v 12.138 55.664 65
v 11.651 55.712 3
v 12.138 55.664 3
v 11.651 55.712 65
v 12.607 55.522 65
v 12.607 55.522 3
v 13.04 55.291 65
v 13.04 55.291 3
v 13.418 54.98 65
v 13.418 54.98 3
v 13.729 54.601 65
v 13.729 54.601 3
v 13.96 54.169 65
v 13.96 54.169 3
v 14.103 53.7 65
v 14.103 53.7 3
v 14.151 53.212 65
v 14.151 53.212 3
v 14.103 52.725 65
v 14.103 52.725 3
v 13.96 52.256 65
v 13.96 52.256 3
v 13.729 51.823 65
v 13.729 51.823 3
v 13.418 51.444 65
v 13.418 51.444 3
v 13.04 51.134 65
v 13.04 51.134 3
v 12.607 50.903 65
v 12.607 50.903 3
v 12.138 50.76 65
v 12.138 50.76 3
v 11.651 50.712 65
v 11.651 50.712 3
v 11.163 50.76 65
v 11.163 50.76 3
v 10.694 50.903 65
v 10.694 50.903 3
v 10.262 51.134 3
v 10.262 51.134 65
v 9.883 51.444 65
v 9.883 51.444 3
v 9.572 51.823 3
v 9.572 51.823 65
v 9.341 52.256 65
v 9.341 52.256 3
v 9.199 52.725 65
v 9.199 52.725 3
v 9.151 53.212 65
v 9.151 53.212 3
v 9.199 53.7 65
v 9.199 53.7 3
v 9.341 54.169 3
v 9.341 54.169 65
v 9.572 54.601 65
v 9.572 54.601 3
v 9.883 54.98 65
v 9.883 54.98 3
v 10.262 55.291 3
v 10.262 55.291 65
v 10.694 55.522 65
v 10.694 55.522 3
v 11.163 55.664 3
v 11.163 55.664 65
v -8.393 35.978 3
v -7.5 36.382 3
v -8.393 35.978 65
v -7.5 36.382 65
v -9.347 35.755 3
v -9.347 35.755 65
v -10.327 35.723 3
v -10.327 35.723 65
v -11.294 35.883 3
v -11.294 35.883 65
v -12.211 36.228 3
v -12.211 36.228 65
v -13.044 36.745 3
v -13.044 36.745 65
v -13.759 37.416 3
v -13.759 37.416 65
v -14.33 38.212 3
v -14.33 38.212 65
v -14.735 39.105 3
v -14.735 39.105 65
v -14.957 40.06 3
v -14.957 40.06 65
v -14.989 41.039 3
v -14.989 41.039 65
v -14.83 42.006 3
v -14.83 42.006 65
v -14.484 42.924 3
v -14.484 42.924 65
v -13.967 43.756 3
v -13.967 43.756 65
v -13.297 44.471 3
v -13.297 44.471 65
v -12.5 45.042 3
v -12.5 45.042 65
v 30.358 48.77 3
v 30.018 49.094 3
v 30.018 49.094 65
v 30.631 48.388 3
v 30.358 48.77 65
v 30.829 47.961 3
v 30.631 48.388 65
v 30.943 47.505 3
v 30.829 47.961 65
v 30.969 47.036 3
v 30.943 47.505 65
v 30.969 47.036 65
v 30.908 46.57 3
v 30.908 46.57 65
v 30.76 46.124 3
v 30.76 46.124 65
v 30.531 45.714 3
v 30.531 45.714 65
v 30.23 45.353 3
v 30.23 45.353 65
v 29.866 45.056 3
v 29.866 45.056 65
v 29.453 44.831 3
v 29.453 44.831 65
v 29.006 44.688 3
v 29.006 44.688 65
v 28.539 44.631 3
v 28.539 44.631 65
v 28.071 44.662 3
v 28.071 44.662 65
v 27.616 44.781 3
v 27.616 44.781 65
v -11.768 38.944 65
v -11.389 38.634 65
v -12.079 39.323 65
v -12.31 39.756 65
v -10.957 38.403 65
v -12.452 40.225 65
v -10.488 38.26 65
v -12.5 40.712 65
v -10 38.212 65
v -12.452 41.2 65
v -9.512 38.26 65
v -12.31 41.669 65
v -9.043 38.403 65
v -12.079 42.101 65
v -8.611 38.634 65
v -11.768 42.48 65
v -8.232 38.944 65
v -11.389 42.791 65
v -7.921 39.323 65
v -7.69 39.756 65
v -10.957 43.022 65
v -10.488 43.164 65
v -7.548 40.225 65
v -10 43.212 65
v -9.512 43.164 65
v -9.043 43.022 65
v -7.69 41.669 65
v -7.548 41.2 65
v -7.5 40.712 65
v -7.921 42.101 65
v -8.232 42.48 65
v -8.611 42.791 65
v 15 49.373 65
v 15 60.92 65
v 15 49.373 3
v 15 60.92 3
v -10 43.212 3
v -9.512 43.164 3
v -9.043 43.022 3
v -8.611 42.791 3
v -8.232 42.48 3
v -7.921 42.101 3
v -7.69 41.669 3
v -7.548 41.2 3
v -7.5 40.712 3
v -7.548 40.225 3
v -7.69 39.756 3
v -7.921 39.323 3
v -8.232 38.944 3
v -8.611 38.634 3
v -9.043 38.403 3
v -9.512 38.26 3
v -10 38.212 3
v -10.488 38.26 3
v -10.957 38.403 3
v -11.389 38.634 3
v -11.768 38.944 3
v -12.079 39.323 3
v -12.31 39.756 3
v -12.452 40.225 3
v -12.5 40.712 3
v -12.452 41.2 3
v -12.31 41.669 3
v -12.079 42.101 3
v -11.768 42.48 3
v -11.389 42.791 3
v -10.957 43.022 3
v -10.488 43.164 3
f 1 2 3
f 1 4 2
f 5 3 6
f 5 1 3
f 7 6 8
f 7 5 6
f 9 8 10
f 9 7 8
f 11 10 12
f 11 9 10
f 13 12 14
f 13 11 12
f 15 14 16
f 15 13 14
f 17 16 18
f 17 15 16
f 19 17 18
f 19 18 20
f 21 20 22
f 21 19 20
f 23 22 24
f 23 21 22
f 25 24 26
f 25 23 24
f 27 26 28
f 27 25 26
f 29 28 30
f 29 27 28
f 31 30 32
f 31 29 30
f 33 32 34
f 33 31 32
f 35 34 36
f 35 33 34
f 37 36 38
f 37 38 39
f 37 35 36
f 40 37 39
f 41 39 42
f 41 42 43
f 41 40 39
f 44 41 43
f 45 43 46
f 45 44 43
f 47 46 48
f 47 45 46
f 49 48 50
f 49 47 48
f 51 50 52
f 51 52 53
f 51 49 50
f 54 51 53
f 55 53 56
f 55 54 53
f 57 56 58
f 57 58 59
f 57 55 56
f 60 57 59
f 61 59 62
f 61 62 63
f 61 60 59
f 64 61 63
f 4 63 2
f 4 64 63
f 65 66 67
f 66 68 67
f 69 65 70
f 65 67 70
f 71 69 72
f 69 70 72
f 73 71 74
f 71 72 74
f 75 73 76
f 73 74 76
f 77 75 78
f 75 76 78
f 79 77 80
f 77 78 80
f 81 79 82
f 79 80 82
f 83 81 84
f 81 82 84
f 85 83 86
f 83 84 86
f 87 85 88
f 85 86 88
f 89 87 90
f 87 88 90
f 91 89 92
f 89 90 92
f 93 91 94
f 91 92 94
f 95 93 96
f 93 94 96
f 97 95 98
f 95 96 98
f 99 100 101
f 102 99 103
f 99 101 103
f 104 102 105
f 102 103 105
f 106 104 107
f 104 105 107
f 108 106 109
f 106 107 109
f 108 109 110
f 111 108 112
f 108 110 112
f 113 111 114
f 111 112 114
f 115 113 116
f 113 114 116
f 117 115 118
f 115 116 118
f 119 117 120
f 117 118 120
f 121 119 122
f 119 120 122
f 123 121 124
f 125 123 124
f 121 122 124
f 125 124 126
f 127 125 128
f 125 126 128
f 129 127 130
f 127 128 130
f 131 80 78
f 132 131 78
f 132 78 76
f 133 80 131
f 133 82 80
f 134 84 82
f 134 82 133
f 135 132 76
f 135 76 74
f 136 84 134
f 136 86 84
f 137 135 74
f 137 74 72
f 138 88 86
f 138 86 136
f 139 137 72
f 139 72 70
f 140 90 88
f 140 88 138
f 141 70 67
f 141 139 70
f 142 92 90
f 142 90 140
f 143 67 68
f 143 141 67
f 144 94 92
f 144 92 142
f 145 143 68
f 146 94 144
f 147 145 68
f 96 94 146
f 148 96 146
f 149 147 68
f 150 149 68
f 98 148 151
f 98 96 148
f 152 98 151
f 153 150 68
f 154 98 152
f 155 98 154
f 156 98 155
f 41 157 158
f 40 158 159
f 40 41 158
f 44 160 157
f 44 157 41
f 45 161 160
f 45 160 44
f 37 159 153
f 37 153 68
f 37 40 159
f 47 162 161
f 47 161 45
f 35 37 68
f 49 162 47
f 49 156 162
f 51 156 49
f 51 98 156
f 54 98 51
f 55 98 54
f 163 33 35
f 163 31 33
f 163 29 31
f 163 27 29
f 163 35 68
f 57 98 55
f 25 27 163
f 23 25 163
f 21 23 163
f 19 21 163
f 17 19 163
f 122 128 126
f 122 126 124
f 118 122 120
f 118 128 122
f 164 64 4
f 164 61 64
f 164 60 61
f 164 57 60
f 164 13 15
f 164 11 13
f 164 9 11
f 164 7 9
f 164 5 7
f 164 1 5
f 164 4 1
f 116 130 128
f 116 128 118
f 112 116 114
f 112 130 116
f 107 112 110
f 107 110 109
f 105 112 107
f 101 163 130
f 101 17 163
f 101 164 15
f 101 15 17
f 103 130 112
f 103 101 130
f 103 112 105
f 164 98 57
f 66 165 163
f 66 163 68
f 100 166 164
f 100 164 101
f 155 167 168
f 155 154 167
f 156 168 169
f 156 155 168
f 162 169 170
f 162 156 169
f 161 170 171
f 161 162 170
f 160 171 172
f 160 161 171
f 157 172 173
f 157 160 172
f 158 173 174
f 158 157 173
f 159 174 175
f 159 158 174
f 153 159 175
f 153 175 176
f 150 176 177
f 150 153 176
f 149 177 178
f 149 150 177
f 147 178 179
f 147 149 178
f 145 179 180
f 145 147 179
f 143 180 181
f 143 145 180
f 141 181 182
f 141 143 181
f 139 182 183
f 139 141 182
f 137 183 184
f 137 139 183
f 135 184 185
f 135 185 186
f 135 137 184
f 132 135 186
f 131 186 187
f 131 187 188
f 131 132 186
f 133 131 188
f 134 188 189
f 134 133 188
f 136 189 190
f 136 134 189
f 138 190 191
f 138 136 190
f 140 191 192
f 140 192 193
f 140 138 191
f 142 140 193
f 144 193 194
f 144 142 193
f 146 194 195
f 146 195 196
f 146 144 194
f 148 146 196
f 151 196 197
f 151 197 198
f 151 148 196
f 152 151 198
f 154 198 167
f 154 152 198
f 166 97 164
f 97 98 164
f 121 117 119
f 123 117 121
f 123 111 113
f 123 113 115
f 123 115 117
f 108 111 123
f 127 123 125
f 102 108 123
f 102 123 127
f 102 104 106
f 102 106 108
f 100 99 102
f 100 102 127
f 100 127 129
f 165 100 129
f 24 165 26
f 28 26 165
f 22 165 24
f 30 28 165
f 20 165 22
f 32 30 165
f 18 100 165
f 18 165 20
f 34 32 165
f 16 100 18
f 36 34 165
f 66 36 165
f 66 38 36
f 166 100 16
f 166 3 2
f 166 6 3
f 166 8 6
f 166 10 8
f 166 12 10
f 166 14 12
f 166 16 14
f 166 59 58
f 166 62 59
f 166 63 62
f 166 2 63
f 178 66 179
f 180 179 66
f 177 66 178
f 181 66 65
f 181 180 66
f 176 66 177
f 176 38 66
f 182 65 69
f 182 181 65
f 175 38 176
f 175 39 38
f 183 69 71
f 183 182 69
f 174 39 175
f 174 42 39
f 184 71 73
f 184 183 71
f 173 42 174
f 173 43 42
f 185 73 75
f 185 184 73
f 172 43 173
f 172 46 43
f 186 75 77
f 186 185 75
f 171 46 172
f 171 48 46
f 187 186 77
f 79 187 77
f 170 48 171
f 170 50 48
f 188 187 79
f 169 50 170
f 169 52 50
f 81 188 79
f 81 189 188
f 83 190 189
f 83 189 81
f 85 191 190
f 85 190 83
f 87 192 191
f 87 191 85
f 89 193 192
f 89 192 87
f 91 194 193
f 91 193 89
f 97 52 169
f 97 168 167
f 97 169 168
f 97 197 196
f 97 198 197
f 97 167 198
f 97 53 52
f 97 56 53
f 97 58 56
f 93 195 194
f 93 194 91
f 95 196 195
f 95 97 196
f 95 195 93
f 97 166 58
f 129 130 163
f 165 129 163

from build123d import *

# Parameters (mm, degrees)
SKETCH_1_R               = 10
SKETCH_1_R_2             = 2.5
EXTRUDE_1_DEPTH          = 70
SKETCH_2_W               = 60
SKETCH_2_H               = 70
SKETCH_2_H_2             = 67.94057246
CUT_EXTRUDE_1_DEPTH      = 70
EXTRUDE_2_DEPTH          = 60
EXTRUDE_3_DEPTH          = 60
CUT_EXTRUDE_3_DEPTH      = 129.790186287
CUT_EXTRUDE_3_DEPTH_BACK = 129.790186287
SKETCH_6_R               = 2.5
CUT_EXTRUDE_4_DEPTH      = 132.384596068
CUT_EXTRUDE_4_DEPTH_BACK = 132.384596068
SKETCH_7_W               = 41.69897569
SKETCH_7_H               = 124.994220232
SKETCH_7_W_2             = 29.374155289
SKETCH_7_H_2             = 127.870011659
CUT_EXTRUDE_5_DEPTH      = 99.780560832
CUT_EXTRUDE_5_DEPTH_BACK = 99.780560832
SKETCH_9_R               = 2.5
EXTRUDE_4_DEPTH          = 2


with BuildPart() as part:
    # 草图1 → 凸台-拉伸1 (new body)
    with BuildSketch(Plane.XY):
        with BuildLine():
            Line((-15, 90), (-15, 0))
            ThreePointArc((-15, 0), (0, -15), (15, 0))
            Line((15, 0), (15, 90))
            ThreePointArc((15, 90), (0, 105), (-15, 90))
        make_face()
        Circle(SKETCH_1_R, mode=Mode.SUBTRACT)
        with Locations((0, 90)):
            Circle(SKETCH_1_R_2, mode=Mode.SUBTRACT)
    extrude(amount=EXTRUDE_1_DEPTH)

    # 草图2 → 切除-拉伸1 (cut)
    with BuildSketch(Plane.ZY.offset(15)):
        with Locations((35, 80)):
            Rectangle(SKETCH_2_W, SKETCH_2_H)
        with Locations((35, 11.02971377)):
            Rectangle(SKETCH_2_W, SKETCH_2_H_2)
    extrude(amount=-CUT_EXTRUDE_1_DEPTH, mode=Mode.SUBTRACT)


with BuildPart() as cut_extrude_1_piece_1:
    # of the separate pieces the step leaves, piece 1, a body of its own (cut_extrude_1_pieces)
    add(part.part.solids().sort_by_distance((15, 0, 0))[0])



with BuildPart() as cut_extrude_1_piece_2:
    # of the separate pieces the step leaves, piece 2, a body of its own (cut_extrude_1_pieces)
    add(part.part.solids().sort_by_distance((15, 0, 65))[0])


with BuildPart() as cut_extrude_1_piece_1_1:
    add(cut_extrude_1_piece_1.part)

    add(cut_extrude_1_piece_2.part)  # 凸台-拉伸2 merges 切除-拉伸1 piece 2
    # 草图4 → 凸台-拉伸2 (add)
    with BuildSketch(Plane(origin=(0, 0, 65), x_dir=(-1, 0, 0), z_dir=(0, 0, -1))):
        with BuildLine():
            Line((-4.490156776, 68.758657712), (15, 57.50601045))
            Line((15, 57.50601045), (36.319312502, 12.911360415))
            ThreePointArc((36.319312502, 12.911360415), (35.142094618, 9.577570071), (31.808304274, 10.754787955))
            Line((31.808304274, 10.754787955), (15, 45.913541163))
            Line((15, 45.913541163), (-9.509843224, 60.064305746))
            ThreePointArc((-9.509843224, 60.064305746), (-11.347175983, 66.921324953), (-4.490156776, 68.758657712))
        make_face()
    extrude(amount=EXTRUDE_2_DEPTH)

    # 草图5 → 凸台-拉伸3 (add)
    with BuildSketch(Plane(origin=(0, 0, 65), x_dir=(-1, 0, 0), z_dir=(0, 0, -1))):
        with BuildLine():
            Line((-30.017605928, 49.094069219), (-15, 60.919508718))
            Line((-15, 60.919508718), (12.5, 45.042376315))
            ThreePointArc((12.5, 45.042376315), (14.330127019, 38.212249296), (7.5, 36.382122277))
            Line((7.5, 36.382122277), (-15, 49.372503334))
            Line((-15, 49.372503334), (-27.615908762, 44.780688066))
            ThreePointArc((-27.615908762, 44.780688066), (-30.655195979, 45.913733224), (-30.017605928, 49.094069219))
        make_face()
    extrude(amount=EXTRUDE_3_DEPTH)

    # 草图6 → 切除-拉伸3 (cut, two sides: drawn at the far end of the back side and taken through both)
    with BuildSketch(Plane(origin=(0, 0, 65), x_dir=(-1, 0, 0), z_dir=(0, 0, -1)).offset(-CUT_EXTRUDE_3_DEPTH_BACK)):
        with Locations(Location((-7, 64.411481729, 0), (0, 0, 90))):
            Circle(SKETCH_6_R)
        with Locations(Location((-11.650635095, 53.212249296, 0), (0, 0, 90))):
            Circle(SKETCH_6_R)
        with Locations(Location((10, 40.712249296, 0), (0, 0, 90))):
            Circle(SKETCH_6_R)
        with Locations(Location((10.320508076, 54.411481729, 0), (0, 0, 90))):
            Circle(SKETCH_6_R)
    extrude(amount=CUT_EXTRUDE_3_DEPTH + CUT_EXTRUDE_3_DEPTH_BACK, mode=Mode.SUBTRACT)

    # 草图7 → 切除-拉伸4 (cut, two sides: drawn at the far end of the back side and taken through both)
    with BuildSketch(Plane(origin=(0, 0, 0), x_dir=(0, 0, -1), z_dir=(1, 0, 0)).offset(-CUT_EXTRUDE_4_DEPTH_BACK)):
        with Locations((15.849487845, 45.30812051)):
            Rectangle(SKETCH_7_W, SKETCH_7_H)
        with Locations((-79.687077644, 43.870224797)):
            Rectangle(SKETCH_7_W_2, SKETCH_7_H_2)
    extrude(amount=CUT_EXTRUDE_4_DEPTH + CUT_EXTRUDE_4_DEPTH_BACK, mode=Mode.SUBTRACT)


with BuildPart() as cut_extrude_4_piece_1:
    # of the separate pieces the step leaves, piece 1, a body of its own (cut_extrude_4_pieces)
    add(cut_extrude_1_piece_1_1.part.solids().sort_by_distance((-15, 45.913541163, 65))[0])

    # 草图8 → 切除-拉伸5 (cut, two sides: drawn at the far end of the back side and taken through both)
    with BuildSketch(Plane(origin=(0, 0, 5), x_dir=(-1, 0, 0), z_dir=(0, 0, -1)).offset(-CUT_EXTRUDE_5_DEPTH_BACK)):
        Polygon((-6.948831874, 74.137409514), (-14.942987604, 67.665950114), (-12.735077926, 60.813816632), (14.064377472, 45.130044439), (31.727654893, 6.225153222), (50.98976346, 4.626322076), (26.322082923, 67.665950114), align=None)
    extrude(amount=CUT_EXTRUDE_5_DEPTH + CUT_EXTRUDE_5_DEPTH_BACK, mode=Mode.SUBTRACT)


with BuildPart() as cut_extrude_4_piece_2:
    # of the separate pieces the step leaves, piece 2, a body of its own (cut_extrude_4_pieces)
    add(cut_extrude_1_piece_1_1.part.solids().sort_by_distance((27.615908762, 44.780688066, 65))[0])

    # 草图9 → 凸台-拉伸4 (add)
    with BuildSketch(Plane(origin=(0, 0, 5), x_dir=(-1, 0, 0), z_dir=(0, 0, -1))):
        with BuildLine():
            Line((-27.615908762, 44.780688066), (-15, 49.372503334))
            Line((-15, 49.372503334), (7.5, 36.382122277))
            ThreePointArc((7.5, 36.382122277), (14.330127019, 38.212249296), (12.5, 45.042376315))
            Line((12.5, 45.042376315), (-15, 60.919508718))
            Line((-15, 60.919508718), (-30.017605928, 49.094069219))
            ThreePointArc((-30.017605928, 49.094069219), (-30.655195979, 45.913733224), (-27.615908762, 44.780688066))
        make_face()
        with Locations(Location((-11.650635095, 53.212249296, 0), (0, 0, 90))):
            Circle(SKETCH_9_R, mode=Mode.SUBTRACT)
        with Locations(Location((10, 40.712249296, 0), (0, 0, 90))):
            Circle(SKETCH_9_R, mode=Mode.SUBTRACT)
    extrude(amount=EXTRUDE_4_DEPTH)


solid = cut_extrude_4_piece_2.part
